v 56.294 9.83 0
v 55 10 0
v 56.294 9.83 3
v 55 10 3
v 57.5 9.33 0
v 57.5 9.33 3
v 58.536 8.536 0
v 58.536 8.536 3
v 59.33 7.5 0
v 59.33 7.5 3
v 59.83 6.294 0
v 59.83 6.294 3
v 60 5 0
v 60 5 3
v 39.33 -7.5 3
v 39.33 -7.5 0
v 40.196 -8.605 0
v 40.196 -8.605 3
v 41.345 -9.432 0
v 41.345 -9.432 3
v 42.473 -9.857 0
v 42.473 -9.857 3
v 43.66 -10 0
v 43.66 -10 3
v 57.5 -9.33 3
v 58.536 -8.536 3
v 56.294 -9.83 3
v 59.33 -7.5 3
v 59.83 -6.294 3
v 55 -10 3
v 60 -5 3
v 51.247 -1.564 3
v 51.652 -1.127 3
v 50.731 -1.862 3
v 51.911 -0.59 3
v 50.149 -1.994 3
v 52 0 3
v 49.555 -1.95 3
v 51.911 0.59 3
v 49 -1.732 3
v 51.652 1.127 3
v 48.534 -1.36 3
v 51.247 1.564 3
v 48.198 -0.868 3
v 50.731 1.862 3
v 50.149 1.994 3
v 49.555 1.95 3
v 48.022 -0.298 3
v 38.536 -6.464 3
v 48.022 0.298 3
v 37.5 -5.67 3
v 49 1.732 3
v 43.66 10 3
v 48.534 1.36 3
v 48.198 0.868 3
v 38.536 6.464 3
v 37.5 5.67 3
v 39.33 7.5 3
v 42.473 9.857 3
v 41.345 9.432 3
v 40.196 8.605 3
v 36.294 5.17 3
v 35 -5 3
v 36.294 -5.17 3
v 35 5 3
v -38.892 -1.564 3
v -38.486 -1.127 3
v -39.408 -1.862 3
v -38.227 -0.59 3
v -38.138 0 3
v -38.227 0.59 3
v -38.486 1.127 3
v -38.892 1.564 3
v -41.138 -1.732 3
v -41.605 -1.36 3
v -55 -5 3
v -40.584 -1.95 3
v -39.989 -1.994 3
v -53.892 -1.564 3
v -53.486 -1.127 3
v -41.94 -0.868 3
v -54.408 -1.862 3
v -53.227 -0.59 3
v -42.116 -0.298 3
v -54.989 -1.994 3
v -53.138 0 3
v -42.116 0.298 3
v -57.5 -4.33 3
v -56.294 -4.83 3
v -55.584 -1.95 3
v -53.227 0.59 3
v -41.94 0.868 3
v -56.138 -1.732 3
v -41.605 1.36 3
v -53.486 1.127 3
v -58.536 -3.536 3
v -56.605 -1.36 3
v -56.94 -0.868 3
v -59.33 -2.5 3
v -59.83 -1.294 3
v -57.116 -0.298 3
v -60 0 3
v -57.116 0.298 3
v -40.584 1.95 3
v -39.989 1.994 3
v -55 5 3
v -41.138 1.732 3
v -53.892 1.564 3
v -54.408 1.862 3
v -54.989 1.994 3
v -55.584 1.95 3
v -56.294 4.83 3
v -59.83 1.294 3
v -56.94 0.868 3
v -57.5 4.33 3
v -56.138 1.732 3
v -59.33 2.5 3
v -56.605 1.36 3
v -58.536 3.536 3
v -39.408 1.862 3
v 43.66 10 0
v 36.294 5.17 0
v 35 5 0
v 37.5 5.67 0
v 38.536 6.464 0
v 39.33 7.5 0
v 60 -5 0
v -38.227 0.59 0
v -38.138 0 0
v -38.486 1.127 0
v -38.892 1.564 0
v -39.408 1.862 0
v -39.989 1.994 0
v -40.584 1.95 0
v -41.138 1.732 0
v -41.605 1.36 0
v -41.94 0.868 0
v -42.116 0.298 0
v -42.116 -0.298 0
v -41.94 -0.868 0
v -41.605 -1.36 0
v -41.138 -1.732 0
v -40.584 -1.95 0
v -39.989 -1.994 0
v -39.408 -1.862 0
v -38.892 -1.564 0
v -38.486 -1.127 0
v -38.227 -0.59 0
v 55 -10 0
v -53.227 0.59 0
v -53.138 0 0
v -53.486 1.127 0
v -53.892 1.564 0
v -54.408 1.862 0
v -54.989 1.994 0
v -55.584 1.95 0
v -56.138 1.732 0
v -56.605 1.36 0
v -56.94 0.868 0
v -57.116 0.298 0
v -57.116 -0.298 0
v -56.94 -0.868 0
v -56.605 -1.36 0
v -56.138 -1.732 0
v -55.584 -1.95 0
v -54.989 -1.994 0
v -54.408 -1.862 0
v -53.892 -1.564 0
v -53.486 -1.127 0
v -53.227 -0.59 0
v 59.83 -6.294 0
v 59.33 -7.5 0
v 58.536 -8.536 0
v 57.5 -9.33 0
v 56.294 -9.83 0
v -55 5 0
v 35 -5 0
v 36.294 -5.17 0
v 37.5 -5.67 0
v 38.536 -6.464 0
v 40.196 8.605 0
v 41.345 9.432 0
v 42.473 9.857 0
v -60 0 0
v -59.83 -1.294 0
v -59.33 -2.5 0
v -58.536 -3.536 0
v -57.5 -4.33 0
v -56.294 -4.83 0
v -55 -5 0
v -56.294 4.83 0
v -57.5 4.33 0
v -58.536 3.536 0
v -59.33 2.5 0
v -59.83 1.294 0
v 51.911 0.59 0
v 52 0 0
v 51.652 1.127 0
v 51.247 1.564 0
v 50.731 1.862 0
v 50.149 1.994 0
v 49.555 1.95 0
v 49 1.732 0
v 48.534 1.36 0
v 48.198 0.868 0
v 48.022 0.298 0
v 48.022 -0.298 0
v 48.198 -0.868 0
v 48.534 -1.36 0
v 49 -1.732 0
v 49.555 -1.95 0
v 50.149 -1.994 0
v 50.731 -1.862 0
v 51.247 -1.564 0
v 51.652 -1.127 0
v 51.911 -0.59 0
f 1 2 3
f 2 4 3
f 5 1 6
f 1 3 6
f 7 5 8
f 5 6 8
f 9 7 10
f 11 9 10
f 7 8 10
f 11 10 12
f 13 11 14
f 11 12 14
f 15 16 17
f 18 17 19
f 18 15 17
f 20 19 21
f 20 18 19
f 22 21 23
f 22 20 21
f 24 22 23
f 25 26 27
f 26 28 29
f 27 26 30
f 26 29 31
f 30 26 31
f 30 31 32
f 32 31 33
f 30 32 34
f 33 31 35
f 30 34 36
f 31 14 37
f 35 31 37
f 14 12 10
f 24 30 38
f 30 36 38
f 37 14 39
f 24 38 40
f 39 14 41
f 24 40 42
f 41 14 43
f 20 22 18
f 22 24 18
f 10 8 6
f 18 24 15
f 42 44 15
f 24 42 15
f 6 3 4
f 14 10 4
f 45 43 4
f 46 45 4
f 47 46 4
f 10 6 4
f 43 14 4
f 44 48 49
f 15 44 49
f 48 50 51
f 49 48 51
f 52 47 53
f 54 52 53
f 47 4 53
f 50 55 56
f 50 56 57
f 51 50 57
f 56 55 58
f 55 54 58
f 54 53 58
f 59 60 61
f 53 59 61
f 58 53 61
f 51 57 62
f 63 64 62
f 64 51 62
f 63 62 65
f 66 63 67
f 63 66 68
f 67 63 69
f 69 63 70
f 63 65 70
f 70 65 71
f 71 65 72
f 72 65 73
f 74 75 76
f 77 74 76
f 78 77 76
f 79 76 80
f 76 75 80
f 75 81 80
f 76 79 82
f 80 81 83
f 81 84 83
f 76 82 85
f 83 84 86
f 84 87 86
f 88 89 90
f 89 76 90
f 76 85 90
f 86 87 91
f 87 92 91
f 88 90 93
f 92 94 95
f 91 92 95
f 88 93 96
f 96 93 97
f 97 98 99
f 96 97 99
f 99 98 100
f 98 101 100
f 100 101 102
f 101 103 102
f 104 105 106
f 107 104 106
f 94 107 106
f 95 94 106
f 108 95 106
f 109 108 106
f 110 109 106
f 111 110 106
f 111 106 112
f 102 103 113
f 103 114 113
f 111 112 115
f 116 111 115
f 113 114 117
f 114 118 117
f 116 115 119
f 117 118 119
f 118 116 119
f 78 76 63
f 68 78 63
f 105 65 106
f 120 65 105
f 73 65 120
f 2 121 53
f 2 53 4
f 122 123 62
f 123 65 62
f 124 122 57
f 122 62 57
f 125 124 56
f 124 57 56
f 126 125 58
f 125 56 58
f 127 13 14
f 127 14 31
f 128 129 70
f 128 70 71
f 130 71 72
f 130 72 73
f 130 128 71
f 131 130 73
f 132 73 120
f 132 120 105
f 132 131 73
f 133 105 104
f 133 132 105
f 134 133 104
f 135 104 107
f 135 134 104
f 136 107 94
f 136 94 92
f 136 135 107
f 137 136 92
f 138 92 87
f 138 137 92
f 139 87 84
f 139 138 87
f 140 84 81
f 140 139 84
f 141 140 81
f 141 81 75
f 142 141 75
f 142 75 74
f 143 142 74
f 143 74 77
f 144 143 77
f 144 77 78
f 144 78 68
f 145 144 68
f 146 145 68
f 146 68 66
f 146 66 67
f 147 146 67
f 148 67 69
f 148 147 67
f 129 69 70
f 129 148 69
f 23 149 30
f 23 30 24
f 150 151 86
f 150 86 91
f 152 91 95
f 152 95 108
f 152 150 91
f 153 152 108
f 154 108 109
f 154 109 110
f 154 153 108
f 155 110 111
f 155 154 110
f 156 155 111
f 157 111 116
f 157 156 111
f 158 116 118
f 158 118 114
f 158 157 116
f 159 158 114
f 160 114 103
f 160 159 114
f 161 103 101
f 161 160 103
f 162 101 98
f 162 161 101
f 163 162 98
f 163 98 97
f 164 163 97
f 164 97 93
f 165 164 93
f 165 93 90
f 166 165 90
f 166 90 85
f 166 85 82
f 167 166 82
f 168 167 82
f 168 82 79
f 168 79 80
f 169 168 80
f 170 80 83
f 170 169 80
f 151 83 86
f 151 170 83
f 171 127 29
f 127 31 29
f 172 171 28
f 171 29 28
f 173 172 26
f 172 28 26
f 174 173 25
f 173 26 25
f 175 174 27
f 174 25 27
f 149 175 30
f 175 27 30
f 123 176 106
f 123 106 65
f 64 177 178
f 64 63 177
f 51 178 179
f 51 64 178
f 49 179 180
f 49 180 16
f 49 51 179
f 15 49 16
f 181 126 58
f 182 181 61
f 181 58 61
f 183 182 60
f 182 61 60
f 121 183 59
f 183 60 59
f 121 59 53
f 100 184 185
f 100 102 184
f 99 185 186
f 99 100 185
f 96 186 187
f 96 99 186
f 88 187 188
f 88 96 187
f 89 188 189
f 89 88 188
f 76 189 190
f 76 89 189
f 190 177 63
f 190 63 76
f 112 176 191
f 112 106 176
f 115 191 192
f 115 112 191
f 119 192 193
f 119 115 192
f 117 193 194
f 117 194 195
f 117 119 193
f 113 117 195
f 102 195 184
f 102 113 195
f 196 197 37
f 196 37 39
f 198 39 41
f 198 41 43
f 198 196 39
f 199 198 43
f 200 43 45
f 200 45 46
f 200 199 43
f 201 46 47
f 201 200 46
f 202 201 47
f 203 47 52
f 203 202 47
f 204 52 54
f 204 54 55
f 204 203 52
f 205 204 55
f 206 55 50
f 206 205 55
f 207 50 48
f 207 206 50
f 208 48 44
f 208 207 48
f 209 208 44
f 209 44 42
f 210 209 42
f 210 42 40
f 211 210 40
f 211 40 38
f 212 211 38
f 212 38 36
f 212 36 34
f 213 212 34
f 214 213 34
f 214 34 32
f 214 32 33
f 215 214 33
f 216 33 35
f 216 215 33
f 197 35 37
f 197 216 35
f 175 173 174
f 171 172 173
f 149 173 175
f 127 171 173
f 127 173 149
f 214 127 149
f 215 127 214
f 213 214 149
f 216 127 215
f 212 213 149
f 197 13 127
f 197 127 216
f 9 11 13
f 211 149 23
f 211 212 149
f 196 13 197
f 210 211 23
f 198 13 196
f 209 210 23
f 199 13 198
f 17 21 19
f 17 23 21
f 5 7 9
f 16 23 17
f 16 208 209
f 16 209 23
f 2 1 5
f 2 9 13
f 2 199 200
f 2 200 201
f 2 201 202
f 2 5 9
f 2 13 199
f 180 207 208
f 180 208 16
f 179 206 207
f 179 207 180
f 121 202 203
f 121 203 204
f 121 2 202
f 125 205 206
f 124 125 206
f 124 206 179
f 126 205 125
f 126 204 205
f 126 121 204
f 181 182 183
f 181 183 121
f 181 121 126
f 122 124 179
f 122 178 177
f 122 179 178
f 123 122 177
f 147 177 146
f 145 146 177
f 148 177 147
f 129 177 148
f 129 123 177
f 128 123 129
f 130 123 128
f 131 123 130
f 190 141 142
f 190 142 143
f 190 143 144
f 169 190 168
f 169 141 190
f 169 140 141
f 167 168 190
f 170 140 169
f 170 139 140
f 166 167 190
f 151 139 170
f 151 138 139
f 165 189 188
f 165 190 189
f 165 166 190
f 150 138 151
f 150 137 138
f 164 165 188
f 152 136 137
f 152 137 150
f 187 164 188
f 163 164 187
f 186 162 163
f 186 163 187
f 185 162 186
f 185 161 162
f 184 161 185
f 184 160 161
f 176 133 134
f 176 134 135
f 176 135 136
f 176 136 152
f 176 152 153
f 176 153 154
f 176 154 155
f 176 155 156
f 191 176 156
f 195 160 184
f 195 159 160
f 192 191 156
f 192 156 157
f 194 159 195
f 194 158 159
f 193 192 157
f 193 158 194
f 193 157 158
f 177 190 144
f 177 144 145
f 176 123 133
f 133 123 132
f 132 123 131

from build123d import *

# Parameters (mm, degrees)
SKETCH_1_R      = 2
EXTRUDE_1_DEPTH = 3
FILLET_2_R      = 5
FILLET_3_R      = 5
FILLET_4_R      = 5


with BuildPart() as part:
    # 草图1 → 凸台-拉伸1 (new body)
    with BuildSketch(Plane.XY):
        Polygon((-60, 5), (40, 5), (40, 10), (60, 10), (60, -10), (40, -10), (40, -5), (-60, -5), align=None)
        with Locations((-55.138487595, 0)):
            Circle(SKETCH_1_R, mode=Mode.SUBTRACT)
        with Locations((-40.138487595, 0)):
            Circle(SKETCH_1_R, mode=Mode.SUBTRACT)
        with Locations((50, 0)):
            Circle(SKETCH_1_R, mode=Mode.SUBTRACT)
    extrude(amount=EXTRUDE_1_DEPTH)

    # 圆角2
    fillet_2_edges = [part.edges().sort_by_distance(p)[0] for p in [
        (-60, -5, 1.5),
        (-60, 5, 1.5),
        (60, -10, 1.5),
        (60, 10, 1.5),
    ]]
    fillet(fillet_2_edges, radius=FILLET_2_R - 0.0001)  # a hair under: the kernel refuses the full size

    # 圆角3
    fillet_3_edges = [part.edges().sort_by_distance(p)[0] for p in [
        (40, -5, 1.5),
        (40, 5, 1.5),
    ]]
    fillet(fillet_3_edges, radius=FILLET_3_R - 0.0001)  # a hair under: the kernel refuses the full size

    # 圆角4
    fillet_4_edges = [part.edges().sort_by_distance(p)[0] for p in [
        (40, -10, 1.5),
        (40, 10, 1.5),
    ]]
    fillet(fillet_4_edges, radius=FILLET_4_R)


solid = part.part
